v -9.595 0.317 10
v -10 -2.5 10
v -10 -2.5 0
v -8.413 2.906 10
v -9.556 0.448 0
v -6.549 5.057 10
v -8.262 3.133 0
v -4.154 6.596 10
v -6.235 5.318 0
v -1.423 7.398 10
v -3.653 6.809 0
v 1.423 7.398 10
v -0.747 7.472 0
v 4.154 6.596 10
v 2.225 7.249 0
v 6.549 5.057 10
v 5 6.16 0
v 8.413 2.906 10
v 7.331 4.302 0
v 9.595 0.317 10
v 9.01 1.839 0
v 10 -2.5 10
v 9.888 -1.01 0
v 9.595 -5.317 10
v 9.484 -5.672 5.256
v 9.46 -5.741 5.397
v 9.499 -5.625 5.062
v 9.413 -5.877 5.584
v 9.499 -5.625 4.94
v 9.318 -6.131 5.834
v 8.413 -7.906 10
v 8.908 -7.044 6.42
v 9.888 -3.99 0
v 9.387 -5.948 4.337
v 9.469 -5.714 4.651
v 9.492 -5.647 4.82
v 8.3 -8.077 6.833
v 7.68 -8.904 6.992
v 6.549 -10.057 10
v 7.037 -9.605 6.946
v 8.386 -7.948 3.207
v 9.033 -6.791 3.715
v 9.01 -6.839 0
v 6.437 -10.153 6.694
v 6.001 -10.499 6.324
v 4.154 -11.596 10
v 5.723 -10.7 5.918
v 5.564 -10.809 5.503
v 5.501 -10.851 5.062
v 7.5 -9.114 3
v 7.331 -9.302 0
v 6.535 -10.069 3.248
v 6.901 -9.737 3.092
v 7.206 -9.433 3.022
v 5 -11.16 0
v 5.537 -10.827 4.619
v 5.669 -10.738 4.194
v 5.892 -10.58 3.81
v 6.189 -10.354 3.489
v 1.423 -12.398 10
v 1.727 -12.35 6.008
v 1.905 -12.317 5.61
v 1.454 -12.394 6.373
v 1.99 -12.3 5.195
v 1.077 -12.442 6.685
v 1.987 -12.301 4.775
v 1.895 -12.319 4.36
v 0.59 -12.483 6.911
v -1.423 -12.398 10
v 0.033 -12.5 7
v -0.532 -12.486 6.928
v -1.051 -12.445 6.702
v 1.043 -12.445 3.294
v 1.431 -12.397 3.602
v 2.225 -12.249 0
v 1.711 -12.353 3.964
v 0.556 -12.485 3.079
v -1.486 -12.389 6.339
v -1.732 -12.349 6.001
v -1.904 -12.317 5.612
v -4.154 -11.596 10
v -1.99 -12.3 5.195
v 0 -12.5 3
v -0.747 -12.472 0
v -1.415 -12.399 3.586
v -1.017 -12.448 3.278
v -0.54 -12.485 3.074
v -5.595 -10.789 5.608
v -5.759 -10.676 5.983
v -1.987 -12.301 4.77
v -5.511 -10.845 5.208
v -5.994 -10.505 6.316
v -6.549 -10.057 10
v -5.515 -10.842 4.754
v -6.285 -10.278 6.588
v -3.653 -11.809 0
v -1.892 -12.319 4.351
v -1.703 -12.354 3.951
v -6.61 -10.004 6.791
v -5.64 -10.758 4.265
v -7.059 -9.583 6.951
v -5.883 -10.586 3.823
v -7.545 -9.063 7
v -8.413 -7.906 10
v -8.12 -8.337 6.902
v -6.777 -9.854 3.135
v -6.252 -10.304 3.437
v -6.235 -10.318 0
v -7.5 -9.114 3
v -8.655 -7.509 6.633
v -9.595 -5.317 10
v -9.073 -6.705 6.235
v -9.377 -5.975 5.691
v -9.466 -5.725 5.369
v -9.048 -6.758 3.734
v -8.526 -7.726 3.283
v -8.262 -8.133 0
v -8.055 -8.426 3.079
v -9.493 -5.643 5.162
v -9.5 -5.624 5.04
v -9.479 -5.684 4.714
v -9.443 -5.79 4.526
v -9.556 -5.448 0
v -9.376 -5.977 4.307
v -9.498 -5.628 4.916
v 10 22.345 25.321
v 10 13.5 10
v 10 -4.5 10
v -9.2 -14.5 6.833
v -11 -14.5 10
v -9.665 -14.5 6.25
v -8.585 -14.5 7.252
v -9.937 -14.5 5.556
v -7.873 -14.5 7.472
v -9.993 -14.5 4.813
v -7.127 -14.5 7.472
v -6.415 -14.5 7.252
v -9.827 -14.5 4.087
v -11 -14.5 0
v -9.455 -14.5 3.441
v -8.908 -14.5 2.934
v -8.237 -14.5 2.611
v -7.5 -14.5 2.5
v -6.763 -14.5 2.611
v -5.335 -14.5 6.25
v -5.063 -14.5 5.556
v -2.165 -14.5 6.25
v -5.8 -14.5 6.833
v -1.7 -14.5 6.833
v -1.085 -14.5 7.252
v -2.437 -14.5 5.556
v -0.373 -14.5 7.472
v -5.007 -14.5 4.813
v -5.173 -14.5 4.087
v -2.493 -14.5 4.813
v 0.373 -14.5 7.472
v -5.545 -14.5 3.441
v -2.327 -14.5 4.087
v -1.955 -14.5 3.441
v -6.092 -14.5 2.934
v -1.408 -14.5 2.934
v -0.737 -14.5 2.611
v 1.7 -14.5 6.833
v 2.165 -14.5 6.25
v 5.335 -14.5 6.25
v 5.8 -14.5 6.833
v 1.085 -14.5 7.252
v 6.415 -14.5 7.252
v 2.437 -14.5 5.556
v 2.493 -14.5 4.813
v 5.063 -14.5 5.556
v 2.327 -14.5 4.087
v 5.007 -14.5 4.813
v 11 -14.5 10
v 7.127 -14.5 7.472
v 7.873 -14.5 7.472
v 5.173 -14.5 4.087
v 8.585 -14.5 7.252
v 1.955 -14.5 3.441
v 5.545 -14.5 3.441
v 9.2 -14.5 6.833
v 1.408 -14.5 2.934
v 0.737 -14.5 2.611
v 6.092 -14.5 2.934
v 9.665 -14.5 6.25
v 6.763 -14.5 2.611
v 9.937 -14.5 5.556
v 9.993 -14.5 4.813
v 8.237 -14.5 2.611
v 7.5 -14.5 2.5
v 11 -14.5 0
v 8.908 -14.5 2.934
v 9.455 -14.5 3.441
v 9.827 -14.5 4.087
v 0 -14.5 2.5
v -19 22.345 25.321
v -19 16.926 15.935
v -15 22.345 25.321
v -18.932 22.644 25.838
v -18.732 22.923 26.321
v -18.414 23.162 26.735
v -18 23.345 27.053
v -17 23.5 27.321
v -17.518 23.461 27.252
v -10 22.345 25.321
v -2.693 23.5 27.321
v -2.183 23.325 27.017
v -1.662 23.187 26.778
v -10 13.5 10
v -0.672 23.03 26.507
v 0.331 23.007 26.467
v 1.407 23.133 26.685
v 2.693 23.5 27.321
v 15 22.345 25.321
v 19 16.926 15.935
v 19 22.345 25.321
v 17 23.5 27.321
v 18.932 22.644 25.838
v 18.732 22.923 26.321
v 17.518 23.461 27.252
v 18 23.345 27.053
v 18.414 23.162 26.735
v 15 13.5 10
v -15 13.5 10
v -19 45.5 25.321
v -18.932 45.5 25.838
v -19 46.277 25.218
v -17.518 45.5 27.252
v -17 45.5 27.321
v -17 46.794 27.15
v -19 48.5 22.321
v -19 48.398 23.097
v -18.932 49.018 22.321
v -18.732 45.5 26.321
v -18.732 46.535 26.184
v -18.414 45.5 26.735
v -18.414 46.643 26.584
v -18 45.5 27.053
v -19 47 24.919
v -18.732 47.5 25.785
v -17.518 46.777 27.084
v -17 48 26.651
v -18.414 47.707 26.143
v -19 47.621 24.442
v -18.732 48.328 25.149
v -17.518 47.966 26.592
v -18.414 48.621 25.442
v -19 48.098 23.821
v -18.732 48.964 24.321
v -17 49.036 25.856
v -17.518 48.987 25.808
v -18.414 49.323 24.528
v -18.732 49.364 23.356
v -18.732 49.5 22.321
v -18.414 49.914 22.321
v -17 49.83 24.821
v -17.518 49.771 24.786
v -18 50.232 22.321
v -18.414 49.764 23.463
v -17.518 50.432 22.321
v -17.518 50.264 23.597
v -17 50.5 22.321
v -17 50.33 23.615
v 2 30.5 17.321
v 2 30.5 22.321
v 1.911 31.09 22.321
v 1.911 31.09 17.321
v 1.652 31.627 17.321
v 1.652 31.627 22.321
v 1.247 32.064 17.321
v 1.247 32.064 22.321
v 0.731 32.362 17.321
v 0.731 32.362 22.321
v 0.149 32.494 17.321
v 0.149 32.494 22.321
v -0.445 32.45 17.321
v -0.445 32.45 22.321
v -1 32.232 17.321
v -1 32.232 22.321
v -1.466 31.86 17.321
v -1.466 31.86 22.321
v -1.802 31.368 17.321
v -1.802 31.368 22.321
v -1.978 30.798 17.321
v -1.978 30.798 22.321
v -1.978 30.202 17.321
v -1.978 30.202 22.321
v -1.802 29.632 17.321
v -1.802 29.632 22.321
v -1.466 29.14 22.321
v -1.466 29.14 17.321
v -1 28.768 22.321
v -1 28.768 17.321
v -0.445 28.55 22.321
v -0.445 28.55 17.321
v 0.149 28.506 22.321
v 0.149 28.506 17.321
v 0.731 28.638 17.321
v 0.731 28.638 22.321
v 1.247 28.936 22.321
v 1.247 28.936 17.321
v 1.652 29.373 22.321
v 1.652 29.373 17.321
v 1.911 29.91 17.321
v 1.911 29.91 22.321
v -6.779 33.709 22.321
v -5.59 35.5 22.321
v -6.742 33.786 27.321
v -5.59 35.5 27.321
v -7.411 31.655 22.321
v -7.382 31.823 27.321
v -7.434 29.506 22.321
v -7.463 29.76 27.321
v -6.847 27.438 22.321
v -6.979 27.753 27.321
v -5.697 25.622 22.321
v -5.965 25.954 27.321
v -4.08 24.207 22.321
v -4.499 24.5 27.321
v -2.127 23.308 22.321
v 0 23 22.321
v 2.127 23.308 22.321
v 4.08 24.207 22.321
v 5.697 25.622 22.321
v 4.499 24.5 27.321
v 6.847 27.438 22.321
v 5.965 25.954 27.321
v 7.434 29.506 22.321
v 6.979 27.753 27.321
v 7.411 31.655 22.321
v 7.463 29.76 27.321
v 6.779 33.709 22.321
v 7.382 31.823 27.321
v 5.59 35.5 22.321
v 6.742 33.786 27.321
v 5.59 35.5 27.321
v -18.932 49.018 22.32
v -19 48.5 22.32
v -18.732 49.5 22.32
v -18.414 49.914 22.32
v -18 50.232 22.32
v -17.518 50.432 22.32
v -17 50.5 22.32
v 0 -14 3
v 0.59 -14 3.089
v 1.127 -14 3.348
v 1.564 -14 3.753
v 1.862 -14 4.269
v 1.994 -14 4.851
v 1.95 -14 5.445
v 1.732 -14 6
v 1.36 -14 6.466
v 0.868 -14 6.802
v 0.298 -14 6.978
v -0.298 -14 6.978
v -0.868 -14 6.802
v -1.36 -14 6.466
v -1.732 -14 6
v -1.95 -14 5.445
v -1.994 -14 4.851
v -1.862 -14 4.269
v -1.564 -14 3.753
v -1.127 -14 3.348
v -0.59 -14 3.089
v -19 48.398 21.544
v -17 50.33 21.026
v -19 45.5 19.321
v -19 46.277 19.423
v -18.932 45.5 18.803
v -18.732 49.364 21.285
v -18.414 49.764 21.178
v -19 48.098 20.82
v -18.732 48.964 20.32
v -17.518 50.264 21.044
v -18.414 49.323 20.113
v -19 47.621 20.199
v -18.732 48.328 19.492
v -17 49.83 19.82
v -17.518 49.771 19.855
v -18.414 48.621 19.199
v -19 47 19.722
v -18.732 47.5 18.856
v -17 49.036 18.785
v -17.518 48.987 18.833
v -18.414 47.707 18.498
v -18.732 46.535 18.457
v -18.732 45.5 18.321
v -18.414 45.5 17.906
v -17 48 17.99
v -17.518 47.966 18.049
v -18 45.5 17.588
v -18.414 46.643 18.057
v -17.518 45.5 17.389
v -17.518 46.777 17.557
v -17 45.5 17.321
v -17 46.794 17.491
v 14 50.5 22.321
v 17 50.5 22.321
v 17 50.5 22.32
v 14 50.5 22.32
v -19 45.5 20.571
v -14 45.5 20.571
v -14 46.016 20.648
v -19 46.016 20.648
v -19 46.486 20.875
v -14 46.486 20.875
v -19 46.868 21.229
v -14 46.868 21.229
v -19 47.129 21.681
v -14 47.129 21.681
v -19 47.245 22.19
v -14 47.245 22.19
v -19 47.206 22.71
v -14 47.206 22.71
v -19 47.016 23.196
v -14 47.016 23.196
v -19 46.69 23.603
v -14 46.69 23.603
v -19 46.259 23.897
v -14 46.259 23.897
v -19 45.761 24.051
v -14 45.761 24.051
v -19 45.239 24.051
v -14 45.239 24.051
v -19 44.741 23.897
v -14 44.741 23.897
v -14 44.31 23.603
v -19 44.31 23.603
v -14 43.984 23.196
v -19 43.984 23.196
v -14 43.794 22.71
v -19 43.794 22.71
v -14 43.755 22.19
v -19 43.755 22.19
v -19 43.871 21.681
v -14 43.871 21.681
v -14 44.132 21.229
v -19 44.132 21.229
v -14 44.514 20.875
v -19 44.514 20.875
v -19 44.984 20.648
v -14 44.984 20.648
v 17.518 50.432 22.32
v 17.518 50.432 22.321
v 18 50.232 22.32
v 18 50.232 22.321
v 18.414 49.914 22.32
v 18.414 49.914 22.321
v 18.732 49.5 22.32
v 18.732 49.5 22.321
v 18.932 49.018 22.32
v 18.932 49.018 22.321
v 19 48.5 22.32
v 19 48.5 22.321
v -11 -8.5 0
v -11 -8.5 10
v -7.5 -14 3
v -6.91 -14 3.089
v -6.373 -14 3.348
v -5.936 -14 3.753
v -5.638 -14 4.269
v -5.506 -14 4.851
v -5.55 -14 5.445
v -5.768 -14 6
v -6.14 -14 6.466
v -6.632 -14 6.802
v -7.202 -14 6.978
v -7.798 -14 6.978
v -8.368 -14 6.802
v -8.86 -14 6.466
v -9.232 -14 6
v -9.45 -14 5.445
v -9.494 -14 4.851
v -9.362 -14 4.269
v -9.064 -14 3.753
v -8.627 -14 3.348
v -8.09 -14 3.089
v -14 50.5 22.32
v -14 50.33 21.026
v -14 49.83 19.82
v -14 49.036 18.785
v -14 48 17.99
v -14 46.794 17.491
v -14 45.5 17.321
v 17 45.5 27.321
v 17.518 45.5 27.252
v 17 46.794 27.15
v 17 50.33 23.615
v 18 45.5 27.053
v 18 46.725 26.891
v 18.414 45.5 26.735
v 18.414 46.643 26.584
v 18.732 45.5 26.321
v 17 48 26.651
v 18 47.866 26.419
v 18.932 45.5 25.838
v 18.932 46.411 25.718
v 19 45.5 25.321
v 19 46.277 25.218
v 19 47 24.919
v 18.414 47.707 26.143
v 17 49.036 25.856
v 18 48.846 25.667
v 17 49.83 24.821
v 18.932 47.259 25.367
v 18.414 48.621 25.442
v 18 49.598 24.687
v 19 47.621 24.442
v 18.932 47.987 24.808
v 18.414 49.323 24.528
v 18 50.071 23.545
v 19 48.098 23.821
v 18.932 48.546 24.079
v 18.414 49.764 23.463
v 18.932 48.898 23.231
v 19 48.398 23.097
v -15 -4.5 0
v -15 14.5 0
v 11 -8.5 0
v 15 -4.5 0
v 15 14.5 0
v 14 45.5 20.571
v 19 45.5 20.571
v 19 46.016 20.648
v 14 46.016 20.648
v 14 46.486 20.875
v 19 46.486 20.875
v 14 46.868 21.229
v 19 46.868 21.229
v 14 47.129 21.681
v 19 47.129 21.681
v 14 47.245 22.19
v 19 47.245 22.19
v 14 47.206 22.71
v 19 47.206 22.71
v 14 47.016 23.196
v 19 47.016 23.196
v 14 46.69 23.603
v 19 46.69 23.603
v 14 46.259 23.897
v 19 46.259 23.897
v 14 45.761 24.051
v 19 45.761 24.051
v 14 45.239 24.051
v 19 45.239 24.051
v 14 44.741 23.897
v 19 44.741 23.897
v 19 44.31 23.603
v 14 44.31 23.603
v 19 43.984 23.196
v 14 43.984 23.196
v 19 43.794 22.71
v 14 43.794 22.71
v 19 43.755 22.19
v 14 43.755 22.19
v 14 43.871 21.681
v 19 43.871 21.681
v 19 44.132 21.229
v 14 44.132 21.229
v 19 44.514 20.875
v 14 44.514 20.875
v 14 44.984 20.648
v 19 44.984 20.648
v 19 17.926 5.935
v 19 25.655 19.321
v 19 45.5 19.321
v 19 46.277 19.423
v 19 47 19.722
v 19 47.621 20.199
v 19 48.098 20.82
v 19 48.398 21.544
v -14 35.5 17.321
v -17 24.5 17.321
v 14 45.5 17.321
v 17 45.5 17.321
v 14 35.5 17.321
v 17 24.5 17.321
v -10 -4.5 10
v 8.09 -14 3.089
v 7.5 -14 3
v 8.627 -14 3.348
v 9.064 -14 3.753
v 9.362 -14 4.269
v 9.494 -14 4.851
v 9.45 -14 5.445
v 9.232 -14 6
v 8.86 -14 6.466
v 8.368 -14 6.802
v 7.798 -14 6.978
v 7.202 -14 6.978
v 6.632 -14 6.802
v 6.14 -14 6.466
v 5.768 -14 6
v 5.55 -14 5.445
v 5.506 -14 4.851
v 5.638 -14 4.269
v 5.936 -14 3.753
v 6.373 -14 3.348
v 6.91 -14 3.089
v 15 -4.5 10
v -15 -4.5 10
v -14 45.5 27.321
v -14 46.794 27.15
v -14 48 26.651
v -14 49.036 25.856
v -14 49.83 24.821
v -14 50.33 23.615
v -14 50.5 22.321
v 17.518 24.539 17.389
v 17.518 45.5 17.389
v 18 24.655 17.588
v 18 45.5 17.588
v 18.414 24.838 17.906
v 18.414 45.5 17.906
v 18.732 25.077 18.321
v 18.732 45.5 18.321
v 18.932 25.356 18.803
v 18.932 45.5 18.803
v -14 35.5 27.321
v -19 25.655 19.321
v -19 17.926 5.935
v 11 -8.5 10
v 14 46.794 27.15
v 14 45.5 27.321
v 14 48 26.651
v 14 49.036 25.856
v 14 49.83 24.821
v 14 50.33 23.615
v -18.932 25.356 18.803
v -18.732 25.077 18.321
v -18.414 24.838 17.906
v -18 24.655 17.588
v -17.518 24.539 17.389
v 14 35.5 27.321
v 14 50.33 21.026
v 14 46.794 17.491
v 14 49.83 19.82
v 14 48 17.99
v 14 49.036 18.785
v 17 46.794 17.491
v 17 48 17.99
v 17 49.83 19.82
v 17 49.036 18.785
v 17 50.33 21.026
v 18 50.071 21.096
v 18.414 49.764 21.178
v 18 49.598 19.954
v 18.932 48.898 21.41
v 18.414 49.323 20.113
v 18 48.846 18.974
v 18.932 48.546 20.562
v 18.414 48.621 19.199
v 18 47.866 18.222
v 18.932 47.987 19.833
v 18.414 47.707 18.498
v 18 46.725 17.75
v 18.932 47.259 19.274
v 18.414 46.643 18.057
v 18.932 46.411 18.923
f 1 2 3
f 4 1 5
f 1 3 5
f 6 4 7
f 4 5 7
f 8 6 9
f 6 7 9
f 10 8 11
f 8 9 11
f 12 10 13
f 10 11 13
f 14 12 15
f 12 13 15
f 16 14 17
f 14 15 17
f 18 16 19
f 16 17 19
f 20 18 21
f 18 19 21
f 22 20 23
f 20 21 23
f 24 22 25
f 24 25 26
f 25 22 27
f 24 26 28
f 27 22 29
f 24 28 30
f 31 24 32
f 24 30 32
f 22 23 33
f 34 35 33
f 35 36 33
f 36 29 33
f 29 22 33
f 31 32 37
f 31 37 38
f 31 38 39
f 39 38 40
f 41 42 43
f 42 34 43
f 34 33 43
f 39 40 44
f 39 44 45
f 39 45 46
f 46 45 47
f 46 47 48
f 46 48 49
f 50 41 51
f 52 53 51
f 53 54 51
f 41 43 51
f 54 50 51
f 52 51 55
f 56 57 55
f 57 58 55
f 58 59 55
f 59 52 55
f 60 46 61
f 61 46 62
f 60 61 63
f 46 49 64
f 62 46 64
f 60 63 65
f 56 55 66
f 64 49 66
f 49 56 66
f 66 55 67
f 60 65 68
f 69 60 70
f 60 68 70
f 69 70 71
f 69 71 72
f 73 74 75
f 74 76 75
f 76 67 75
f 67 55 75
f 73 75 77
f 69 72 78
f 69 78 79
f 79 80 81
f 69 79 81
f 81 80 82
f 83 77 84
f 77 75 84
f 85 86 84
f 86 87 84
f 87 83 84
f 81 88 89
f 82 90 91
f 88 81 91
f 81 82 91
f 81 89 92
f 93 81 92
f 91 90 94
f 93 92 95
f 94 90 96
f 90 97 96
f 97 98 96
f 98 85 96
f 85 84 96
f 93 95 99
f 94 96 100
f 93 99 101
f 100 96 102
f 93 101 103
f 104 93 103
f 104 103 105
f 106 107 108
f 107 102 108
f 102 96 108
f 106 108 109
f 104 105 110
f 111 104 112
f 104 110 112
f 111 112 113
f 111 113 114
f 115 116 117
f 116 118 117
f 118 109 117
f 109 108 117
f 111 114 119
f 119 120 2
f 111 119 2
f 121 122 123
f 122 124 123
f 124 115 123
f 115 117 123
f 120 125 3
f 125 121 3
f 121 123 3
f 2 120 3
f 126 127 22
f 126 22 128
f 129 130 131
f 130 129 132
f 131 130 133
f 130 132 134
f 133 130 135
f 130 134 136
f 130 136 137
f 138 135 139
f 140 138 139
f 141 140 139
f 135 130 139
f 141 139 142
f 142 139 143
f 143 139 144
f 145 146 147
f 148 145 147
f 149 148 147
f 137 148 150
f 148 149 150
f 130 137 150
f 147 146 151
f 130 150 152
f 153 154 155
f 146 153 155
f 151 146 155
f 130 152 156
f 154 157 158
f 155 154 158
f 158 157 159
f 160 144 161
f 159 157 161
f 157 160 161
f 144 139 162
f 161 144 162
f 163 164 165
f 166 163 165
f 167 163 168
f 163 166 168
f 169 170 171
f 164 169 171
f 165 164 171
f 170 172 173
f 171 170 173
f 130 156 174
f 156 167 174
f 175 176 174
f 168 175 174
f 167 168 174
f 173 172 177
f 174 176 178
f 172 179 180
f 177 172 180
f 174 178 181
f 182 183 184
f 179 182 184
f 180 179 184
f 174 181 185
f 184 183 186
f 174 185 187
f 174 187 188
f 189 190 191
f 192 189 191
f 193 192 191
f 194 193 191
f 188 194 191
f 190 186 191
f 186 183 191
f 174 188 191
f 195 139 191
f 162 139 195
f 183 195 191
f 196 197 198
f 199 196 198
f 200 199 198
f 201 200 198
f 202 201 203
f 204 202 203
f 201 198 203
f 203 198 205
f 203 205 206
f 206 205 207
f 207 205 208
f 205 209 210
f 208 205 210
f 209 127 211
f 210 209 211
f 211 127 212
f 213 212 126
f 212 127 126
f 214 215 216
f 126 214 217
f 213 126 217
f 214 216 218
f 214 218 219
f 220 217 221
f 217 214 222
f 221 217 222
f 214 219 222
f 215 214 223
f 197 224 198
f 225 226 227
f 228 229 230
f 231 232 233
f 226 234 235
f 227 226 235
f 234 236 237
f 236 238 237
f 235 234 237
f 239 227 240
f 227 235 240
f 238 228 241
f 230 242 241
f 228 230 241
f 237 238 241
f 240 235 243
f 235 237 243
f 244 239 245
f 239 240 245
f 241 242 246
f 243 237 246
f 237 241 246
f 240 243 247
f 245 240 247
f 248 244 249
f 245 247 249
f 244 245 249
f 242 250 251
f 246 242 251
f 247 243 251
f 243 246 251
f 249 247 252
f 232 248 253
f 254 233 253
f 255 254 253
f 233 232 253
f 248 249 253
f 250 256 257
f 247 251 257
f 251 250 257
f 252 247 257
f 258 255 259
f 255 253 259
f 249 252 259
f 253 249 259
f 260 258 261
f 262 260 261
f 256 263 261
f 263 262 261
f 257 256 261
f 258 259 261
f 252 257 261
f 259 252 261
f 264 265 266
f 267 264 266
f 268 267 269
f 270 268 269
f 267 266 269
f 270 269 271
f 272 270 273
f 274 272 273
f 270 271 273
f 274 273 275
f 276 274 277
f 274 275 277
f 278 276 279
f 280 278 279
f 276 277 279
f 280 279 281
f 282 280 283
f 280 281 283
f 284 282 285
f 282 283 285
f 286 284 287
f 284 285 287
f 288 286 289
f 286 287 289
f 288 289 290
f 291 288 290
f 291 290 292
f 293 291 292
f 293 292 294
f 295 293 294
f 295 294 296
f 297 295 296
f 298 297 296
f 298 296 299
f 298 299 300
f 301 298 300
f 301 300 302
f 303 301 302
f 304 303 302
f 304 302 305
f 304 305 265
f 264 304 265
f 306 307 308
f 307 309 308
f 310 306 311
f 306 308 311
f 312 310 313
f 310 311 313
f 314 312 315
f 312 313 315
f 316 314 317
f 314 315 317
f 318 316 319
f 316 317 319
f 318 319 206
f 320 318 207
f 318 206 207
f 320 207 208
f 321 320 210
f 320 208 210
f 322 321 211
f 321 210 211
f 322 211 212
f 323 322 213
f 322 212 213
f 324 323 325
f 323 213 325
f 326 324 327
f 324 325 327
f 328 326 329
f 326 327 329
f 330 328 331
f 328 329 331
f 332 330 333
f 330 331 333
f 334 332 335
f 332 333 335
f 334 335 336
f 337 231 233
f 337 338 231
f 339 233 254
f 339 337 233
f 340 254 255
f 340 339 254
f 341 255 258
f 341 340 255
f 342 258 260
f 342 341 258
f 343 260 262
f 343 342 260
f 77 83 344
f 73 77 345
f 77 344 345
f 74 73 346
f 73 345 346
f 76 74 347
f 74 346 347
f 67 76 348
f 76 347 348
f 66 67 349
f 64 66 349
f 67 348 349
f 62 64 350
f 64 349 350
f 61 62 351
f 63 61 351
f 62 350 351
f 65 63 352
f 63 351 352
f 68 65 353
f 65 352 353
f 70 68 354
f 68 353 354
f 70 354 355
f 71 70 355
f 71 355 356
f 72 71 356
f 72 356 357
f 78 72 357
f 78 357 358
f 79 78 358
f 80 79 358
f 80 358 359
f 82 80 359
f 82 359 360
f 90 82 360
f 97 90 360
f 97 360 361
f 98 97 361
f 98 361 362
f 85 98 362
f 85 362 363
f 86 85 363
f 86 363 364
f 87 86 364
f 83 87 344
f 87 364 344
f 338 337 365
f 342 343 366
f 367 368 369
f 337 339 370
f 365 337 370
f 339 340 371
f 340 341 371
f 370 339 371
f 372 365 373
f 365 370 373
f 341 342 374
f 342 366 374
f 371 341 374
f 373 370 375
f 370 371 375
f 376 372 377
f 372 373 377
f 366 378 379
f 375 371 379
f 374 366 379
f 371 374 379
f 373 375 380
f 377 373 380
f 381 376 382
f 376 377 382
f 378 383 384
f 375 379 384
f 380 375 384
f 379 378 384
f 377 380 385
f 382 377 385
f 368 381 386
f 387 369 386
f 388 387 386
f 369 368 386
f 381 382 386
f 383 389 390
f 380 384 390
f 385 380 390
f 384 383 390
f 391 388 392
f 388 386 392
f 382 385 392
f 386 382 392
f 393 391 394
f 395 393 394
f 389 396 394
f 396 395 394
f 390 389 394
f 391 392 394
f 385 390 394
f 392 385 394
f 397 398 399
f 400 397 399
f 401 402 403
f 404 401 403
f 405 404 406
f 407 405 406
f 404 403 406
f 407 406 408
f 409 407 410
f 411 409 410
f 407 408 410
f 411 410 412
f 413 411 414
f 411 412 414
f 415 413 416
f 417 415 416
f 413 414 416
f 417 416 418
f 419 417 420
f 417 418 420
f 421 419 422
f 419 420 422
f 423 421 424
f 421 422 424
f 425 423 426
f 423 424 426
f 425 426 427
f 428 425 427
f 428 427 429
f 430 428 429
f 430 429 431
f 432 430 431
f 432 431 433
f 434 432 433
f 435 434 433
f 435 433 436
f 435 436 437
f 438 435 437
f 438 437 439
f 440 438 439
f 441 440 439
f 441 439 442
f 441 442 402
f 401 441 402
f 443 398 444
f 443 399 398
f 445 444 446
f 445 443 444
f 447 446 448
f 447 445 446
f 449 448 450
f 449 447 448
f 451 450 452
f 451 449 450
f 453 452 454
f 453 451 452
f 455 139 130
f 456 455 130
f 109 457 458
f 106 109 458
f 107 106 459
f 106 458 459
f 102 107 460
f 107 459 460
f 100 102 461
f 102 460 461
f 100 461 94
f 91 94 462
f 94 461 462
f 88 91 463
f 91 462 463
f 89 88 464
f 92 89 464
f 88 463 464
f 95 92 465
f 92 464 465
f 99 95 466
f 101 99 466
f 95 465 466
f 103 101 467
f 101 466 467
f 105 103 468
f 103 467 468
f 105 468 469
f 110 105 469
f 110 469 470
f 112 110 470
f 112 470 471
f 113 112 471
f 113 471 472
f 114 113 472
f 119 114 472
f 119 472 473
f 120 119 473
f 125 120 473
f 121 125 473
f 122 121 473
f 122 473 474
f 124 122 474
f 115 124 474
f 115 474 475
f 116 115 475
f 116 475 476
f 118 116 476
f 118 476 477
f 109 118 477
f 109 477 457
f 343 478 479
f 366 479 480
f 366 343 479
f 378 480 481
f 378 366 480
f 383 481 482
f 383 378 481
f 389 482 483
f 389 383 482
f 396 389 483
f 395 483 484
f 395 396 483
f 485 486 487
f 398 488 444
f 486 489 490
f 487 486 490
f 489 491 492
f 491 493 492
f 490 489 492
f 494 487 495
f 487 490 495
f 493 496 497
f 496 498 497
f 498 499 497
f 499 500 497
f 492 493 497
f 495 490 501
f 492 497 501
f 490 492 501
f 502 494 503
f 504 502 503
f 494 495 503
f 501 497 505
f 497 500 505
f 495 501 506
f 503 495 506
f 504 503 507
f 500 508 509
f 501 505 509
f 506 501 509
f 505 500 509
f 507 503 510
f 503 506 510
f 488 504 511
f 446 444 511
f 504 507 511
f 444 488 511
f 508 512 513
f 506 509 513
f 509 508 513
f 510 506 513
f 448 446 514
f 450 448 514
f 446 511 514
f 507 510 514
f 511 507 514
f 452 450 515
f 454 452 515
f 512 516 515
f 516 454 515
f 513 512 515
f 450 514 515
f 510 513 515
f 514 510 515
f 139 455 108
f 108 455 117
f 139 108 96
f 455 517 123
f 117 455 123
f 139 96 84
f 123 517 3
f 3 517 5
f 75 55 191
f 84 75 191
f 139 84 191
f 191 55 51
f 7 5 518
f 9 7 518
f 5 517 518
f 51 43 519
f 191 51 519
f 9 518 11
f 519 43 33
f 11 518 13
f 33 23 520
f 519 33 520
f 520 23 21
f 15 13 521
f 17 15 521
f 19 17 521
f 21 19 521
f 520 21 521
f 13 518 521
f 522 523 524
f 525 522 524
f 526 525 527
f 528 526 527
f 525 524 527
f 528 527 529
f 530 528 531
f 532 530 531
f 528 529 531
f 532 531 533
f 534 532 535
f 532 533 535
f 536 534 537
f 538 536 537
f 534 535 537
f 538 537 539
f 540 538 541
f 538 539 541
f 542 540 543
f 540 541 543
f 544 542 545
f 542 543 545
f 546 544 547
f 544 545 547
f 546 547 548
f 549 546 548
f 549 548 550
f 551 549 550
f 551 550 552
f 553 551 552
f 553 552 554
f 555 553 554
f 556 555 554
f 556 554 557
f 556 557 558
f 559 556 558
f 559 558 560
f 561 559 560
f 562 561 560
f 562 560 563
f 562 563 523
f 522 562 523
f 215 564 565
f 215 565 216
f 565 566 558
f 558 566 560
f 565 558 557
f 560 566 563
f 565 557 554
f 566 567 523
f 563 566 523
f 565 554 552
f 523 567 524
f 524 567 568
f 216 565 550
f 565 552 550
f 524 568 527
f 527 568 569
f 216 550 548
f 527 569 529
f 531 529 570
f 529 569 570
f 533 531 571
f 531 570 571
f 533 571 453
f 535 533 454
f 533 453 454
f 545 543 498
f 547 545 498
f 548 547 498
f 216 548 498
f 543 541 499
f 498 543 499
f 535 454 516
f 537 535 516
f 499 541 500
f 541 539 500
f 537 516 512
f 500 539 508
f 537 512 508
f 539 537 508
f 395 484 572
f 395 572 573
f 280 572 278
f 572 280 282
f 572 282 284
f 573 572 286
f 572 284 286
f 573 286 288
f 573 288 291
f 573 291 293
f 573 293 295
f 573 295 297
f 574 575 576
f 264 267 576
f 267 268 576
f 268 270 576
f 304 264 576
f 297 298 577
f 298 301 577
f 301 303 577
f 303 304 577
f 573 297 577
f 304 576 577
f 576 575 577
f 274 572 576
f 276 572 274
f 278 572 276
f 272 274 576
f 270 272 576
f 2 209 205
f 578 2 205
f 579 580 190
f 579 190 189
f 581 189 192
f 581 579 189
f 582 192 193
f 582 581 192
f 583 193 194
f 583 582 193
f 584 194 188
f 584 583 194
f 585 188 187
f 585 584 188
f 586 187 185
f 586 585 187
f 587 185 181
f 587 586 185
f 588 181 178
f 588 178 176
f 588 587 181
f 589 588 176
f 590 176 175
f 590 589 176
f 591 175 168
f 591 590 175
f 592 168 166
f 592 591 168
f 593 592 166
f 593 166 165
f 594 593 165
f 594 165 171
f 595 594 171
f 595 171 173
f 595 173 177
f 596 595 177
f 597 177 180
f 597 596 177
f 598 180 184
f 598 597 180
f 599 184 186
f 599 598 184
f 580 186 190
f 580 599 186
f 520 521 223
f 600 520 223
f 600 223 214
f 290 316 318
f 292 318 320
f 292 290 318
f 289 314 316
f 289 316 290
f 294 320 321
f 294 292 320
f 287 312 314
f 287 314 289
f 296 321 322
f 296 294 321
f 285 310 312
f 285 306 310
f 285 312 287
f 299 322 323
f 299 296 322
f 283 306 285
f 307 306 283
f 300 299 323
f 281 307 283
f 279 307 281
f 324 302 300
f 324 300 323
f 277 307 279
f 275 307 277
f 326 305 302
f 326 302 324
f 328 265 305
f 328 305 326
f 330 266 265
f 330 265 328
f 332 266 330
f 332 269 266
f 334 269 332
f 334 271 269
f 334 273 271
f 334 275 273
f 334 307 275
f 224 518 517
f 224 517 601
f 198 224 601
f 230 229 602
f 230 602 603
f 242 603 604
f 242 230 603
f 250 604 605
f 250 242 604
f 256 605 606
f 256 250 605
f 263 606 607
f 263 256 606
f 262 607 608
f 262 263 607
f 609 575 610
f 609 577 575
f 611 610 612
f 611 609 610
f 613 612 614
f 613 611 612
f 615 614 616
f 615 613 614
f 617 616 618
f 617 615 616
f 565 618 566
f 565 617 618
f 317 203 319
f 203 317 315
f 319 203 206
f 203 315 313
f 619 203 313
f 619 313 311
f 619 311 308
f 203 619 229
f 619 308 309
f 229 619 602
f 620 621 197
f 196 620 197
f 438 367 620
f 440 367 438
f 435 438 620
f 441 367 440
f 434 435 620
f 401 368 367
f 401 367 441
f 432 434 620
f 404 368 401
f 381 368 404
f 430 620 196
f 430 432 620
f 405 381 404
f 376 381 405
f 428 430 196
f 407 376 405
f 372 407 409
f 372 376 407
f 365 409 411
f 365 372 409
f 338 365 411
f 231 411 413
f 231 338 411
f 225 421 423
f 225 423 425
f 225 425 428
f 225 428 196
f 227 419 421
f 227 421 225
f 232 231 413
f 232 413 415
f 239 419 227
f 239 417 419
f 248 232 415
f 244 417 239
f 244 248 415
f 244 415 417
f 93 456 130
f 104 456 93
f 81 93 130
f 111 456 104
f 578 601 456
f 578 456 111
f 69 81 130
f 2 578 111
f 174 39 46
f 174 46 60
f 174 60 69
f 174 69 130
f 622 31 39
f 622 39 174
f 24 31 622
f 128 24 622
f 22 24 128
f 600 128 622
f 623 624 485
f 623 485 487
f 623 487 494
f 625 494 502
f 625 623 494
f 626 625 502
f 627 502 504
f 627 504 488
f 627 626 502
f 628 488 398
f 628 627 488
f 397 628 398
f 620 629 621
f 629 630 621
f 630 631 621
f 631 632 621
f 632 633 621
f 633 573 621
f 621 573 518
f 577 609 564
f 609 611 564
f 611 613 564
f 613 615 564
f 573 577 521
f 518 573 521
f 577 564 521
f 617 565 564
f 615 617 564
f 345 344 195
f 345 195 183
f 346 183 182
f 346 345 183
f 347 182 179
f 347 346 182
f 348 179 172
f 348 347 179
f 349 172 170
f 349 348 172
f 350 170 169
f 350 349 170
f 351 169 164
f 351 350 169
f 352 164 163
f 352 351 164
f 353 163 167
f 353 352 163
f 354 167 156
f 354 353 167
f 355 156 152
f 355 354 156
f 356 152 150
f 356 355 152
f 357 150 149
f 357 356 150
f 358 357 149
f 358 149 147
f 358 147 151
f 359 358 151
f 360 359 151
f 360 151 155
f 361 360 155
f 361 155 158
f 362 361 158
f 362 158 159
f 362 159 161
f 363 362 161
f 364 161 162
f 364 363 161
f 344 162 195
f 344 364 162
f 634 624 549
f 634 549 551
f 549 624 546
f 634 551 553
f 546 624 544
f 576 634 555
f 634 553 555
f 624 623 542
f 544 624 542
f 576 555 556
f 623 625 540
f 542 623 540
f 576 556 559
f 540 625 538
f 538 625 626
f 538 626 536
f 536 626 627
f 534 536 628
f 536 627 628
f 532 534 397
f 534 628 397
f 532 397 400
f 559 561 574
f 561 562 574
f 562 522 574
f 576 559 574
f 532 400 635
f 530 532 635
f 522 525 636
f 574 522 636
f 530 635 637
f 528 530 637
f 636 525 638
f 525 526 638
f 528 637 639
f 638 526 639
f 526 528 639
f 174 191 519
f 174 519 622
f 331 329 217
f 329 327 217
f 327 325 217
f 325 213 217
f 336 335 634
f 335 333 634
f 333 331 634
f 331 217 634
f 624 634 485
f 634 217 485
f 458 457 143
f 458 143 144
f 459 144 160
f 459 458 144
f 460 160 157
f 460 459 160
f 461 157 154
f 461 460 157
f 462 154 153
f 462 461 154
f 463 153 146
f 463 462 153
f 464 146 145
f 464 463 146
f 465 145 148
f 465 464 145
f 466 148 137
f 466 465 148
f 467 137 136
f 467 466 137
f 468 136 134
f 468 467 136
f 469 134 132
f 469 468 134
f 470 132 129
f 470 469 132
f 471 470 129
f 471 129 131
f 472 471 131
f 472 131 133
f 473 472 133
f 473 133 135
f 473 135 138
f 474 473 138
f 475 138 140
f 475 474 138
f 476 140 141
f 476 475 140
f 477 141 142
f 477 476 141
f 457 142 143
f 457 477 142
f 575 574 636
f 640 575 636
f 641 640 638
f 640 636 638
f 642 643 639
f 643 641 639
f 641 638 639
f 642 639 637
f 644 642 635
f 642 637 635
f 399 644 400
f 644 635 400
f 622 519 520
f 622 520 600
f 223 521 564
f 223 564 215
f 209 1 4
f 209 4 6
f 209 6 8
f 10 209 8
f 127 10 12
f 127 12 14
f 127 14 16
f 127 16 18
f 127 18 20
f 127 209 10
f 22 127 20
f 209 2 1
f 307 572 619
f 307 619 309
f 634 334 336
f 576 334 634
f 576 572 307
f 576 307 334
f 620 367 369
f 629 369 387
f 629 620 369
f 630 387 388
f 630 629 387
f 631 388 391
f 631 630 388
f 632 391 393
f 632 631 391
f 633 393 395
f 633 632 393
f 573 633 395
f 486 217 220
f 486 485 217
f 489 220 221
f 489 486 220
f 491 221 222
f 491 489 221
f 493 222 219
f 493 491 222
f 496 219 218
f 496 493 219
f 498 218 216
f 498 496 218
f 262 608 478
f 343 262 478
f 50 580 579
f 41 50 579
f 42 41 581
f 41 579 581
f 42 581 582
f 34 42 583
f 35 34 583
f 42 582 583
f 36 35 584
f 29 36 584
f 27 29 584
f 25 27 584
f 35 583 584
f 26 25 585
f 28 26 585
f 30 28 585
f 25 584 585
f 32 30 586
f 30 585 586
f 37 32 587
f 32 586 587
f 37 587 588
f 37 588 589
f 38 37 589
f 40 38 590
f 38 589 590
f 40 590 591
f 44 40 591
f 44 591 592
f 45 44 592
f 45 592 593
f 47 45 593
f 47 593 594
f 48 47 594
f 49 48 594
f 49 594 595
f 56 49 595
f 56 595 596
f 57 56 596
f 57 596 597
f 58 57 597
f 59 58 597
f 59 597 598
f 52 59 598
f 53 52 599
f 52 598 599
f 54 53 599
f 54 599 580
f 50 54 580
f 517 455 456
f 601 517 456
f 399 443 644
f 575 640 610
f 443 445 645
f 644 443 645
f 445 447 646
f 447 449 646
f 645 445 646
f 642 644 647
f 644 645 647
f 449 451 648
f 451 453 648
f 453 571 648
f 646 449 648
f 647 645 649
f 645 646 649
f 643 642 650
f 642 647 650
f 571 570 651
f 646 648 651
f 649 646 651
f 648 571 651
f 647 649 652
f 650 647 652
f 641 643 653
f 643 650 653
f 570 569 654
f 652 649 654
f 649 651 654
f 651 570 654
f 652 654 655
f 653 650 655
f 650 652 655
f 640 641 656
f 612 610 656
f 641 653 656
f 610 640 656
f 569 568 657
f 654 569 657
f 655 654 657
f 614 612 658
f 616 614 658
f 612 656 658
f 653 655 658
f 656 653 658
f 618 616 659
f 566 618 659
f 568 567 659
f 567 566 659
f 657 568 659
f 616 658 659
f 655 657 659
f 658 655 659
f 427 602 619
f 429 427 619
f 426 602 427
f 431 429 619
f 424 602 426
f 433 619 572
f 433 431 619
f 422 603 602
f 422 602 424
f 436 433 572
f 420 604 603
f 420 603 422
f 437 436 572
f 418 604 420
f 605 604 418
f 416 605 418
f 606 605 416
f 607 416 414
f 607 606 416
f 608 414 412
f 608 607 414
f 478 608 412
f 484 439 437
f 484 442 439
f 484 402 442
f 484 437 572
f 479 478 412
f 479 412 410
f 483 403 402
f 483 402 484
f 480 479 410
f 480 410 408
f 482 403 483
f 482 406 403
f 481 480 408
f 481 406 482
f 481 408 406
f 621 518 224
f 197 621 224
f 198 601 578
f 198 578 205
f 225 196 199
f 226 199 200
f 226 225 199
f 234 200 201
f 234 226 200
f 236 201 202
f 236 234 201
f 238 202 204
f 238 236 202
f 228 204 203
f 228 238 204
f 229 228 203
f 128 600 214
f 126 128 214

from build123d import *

# Parameters (mm, degrees)
SKETCH1_W           = 30
SKETCH1_H           = 29
BOSS_EXTRUDE1_DEPTH = 10
SKETCH2_W           = 4
SKETCH2_H           = 10
CUT_EXTRUDE1_DEPTH  = 10
CHAMFER1_SIZE       = 4
SKETCH3_R           = 2
CUT_EXTRUDE2_DEPTH  = 15
CHAMFER2_SIZE       = 0.5
SKETCH4_R           = 10
CUT_EXTRUDE3_DEPTH  = 24.135470603
BOSS_EXTRUDE2_DEPTH = 19
CHAMFER3_SIZE       = 4
SKETCH6_W           = 28
SKETCH6_H           = 10
CUT_EXTRUDE4_DEPTH  = 15
FILLET1_R           = 5
SKETCH7_R           = 1.75
CUT_EXTRUDE5_DEPTH  = 69.85245211
FILLET2_R           = 2
SKETCH8_R           = 2
CUT_EXTRUDE6_DEPTH  = 61.478592634
SKETCH9_R           = 7.5
CUT_EXTRUDE7_DEPTH  = 5
BOSS_EXTRUDE3_DEPTH = 5


with BuildPart() as part:
    # Sketch1 → Boss-Extrude1 (new body)
    with BuildSketch(Plane.XY):
        Rectangle(SKETCH1_W, SKETCH1_H)
    extrude(amount=BOSS_EXTRUDE1_DEPTH)

    # Sketch2 → Cut-Extrude1 (cut)
    with BuildSketch(Plane.XZ.offset(14.5)):
        with Locations((-13, 5)):
            Rectangle(SKETCH2_W, SKETCH2_H)
        with Locations((13, 5)):
            Rectangle(SKETCH2_W, SKETCH2_H)
    extrude(amount=-CUT_EXTRUDE1_DEPTH, mode=Mode.SUBTRACT)

    # Chamfer1
    chamfer1_edges = [part.edges().sort_by_distance(p)[0] for p in [
        (11, -4.5, 5),
        (-11, -4.5, 5),
    ]]
    chamfer(chamfer1_edges, length=CHAMFER1_SIZE - 0.0001)  # a hair under: the kernel refuses the full size

    # Sketch3 → Cut-Extrude2 (cut)
    with BuildSketch(Plane.XZ.offset(14.5)):
        with Locations(Location((-7.5, 5, 0), (0, 0, 270))):
            Circle(SKETCH3_R)
        with Locations(Location((0, 5, 0), (0, 0, 270))):
            Circle(SKETCH3_R)
        with Locations(Location((7.5, 5, 0), (0, 0, 270))):
            Circle(SKETCH3_R)
    extrude(amount=-CUT_EXTRUDE2_DEPTH, mode=Mode.SUBTRACT)

    # Chamfer2
    chamfer2_edges = [part.edges().sort_by_distance(p)[0] for p in [
        (-7.5, -14.5, 7),
        (0, -14.5, 7),
        (7.5, -14.5, 7),
    ]]
    chamfer(chamfer2_edges, length=CHAMFER2_SIZE)

    # Sketch4 → Cut-Extrude3 (cut, through all)
    with BuildSketch(Plane(origin=(0, 0, 0), x_dir=(-1, 0, 0), z_dir=(0, 0, -1))):
        with Locations((0, -2.5)):
            Circle(SKETCH4_R)
    extrude(amount=-CUT_EXTRUDE3_DEPTH, mode=Mode.SUBTRACT)

    # Sketch5 → Boss-Extrude2 (add, symmetric)
    with BuildSketch(Plane(origin=(0, 0, 0), x_dir=(0, 0, -1), z_dir=(1, 0, 0))):
        Polygon((-10, 13.5), (-27.320508076, 23.5), (-27.320508076, 50.5), (-17.320508076, 50.5), (-17.320508076, 24.5), (0, 14.5), align=None)
    extrude(amount=BOSS_EXTRUDE2_DEPTH, both=True)

    # Chamfer3
    chamfer3_edges = [part.edges().sort_by_distance(p)[0] for p in [
        (-19, 14, 5),
        (19, 14, 5),
    ]]
    chamfer(chamfer3_edges, length=CHAMFER3_SIZE - 0.0001)  # a hair under: the kernel refuses the full size

    # Sketch6 → Cut-Extrude4 (cut)
    with BuildSketch(Plane(origin=(0, 50.5, 0), x_dir=(1, 0, 0), z_dir=(0, 1, 0))):
        with Locations((0, -22.320508076)):
            Rectangle(SKETCH6_W, SKETCH6_H)
    extrude(amount=-CUT_EXTRUDE4_DEPTH, mode=Mode.SUBTRACT)

    # Fillet1
    fillet1_edges = [part.edges().sort_by_distance(p)[0] for p in [
        (16.5, 50.5, 17.320508076),
        (16.5, 50.5, 27.320508076),
        (-16.5, 50.5, 17.320508076),
        (-16.5, 50.5, 27.320508076),
    ]]
    fillet(fillet1_edges, radius=FILLET1_R - 0.0001)  # a hair under: the kernel refuses the full size

    # Sketch7 → Cut-Extrude5 (cut, through all)
    with BuildSketch(Plane(origin=(19, 0, 0), x_dir=(0, 0, -1), z_dir=(1, 0, 0))):
        with Locations((-22.320508076, 45.5)):
            Circle(SKETCH7_R)
    extrude(amount=-CUT_EXTRUDE5_DEPTH, mode=Mode.SUBTRACT)

    # Fillet2
    fillet2_edges = [part.edges().sort_by_distance(p)[0] for p in [
        (19, 34.50005, 27.320508076),
        (19, 49.035563195, 25.856071271),
        (19, 49.035563195, 18.78494488),
        (-19, 34.50005, 27.320508076),
        (-19, 49.035563195, 25.856071271),
        (-19, 49.035563195, 18.78494488),
        (-19, 35.00005, 17.320508076),
        (19, 35.00005, 17.320508076),
    ]]
    fillet(fillet2_edges, radius=FILLET2_R)

    # Sketch8 → Cut-Extrude6 (cut, through all)
    with BuildSketch(Plane.XY.offset(27.320508076)):
        with Locations((0, 30.5)):
            Circle(SKETCH8_R)
    extrude(amount=-CUT_EXTRUDE6_DEPTH, mode=Mode.SUBTRACT)

    # Sketch9 → Cut-Extrude7 (cut)
    with BuildSketch(Plane.XY.offset(27.320508076)):
        with Locations((0, 30.5)):
            Circle(SKETCH9_R)
    extrude(amount=-CUT_EXTRUDE7_DEPTH, mode=Mode.SUBTRACT)

    # Sketch10 → Boss-Extrude3 (add)
    with BuildSketch(Plane(origin=(15, 0, 0), x_dir=(0, 0, -1), z_dir=(1, 0, 0))):
        Polygon((-10, -4.5), (-25.320508076, 22.345299462), (-10, 13.5), align=None)
    boss_extrude3 = extrude(amount=-BOSS_EXTRUDE3_DEPTH)

    # Mirror1: Boss-Extrude3 across plane
    add(boss_extrude3.mirror(Plane(origin=(0, 0, 0), x_dir=(0, 0, 1), z_dir=(1, 0, 0))))


solid = part.part
